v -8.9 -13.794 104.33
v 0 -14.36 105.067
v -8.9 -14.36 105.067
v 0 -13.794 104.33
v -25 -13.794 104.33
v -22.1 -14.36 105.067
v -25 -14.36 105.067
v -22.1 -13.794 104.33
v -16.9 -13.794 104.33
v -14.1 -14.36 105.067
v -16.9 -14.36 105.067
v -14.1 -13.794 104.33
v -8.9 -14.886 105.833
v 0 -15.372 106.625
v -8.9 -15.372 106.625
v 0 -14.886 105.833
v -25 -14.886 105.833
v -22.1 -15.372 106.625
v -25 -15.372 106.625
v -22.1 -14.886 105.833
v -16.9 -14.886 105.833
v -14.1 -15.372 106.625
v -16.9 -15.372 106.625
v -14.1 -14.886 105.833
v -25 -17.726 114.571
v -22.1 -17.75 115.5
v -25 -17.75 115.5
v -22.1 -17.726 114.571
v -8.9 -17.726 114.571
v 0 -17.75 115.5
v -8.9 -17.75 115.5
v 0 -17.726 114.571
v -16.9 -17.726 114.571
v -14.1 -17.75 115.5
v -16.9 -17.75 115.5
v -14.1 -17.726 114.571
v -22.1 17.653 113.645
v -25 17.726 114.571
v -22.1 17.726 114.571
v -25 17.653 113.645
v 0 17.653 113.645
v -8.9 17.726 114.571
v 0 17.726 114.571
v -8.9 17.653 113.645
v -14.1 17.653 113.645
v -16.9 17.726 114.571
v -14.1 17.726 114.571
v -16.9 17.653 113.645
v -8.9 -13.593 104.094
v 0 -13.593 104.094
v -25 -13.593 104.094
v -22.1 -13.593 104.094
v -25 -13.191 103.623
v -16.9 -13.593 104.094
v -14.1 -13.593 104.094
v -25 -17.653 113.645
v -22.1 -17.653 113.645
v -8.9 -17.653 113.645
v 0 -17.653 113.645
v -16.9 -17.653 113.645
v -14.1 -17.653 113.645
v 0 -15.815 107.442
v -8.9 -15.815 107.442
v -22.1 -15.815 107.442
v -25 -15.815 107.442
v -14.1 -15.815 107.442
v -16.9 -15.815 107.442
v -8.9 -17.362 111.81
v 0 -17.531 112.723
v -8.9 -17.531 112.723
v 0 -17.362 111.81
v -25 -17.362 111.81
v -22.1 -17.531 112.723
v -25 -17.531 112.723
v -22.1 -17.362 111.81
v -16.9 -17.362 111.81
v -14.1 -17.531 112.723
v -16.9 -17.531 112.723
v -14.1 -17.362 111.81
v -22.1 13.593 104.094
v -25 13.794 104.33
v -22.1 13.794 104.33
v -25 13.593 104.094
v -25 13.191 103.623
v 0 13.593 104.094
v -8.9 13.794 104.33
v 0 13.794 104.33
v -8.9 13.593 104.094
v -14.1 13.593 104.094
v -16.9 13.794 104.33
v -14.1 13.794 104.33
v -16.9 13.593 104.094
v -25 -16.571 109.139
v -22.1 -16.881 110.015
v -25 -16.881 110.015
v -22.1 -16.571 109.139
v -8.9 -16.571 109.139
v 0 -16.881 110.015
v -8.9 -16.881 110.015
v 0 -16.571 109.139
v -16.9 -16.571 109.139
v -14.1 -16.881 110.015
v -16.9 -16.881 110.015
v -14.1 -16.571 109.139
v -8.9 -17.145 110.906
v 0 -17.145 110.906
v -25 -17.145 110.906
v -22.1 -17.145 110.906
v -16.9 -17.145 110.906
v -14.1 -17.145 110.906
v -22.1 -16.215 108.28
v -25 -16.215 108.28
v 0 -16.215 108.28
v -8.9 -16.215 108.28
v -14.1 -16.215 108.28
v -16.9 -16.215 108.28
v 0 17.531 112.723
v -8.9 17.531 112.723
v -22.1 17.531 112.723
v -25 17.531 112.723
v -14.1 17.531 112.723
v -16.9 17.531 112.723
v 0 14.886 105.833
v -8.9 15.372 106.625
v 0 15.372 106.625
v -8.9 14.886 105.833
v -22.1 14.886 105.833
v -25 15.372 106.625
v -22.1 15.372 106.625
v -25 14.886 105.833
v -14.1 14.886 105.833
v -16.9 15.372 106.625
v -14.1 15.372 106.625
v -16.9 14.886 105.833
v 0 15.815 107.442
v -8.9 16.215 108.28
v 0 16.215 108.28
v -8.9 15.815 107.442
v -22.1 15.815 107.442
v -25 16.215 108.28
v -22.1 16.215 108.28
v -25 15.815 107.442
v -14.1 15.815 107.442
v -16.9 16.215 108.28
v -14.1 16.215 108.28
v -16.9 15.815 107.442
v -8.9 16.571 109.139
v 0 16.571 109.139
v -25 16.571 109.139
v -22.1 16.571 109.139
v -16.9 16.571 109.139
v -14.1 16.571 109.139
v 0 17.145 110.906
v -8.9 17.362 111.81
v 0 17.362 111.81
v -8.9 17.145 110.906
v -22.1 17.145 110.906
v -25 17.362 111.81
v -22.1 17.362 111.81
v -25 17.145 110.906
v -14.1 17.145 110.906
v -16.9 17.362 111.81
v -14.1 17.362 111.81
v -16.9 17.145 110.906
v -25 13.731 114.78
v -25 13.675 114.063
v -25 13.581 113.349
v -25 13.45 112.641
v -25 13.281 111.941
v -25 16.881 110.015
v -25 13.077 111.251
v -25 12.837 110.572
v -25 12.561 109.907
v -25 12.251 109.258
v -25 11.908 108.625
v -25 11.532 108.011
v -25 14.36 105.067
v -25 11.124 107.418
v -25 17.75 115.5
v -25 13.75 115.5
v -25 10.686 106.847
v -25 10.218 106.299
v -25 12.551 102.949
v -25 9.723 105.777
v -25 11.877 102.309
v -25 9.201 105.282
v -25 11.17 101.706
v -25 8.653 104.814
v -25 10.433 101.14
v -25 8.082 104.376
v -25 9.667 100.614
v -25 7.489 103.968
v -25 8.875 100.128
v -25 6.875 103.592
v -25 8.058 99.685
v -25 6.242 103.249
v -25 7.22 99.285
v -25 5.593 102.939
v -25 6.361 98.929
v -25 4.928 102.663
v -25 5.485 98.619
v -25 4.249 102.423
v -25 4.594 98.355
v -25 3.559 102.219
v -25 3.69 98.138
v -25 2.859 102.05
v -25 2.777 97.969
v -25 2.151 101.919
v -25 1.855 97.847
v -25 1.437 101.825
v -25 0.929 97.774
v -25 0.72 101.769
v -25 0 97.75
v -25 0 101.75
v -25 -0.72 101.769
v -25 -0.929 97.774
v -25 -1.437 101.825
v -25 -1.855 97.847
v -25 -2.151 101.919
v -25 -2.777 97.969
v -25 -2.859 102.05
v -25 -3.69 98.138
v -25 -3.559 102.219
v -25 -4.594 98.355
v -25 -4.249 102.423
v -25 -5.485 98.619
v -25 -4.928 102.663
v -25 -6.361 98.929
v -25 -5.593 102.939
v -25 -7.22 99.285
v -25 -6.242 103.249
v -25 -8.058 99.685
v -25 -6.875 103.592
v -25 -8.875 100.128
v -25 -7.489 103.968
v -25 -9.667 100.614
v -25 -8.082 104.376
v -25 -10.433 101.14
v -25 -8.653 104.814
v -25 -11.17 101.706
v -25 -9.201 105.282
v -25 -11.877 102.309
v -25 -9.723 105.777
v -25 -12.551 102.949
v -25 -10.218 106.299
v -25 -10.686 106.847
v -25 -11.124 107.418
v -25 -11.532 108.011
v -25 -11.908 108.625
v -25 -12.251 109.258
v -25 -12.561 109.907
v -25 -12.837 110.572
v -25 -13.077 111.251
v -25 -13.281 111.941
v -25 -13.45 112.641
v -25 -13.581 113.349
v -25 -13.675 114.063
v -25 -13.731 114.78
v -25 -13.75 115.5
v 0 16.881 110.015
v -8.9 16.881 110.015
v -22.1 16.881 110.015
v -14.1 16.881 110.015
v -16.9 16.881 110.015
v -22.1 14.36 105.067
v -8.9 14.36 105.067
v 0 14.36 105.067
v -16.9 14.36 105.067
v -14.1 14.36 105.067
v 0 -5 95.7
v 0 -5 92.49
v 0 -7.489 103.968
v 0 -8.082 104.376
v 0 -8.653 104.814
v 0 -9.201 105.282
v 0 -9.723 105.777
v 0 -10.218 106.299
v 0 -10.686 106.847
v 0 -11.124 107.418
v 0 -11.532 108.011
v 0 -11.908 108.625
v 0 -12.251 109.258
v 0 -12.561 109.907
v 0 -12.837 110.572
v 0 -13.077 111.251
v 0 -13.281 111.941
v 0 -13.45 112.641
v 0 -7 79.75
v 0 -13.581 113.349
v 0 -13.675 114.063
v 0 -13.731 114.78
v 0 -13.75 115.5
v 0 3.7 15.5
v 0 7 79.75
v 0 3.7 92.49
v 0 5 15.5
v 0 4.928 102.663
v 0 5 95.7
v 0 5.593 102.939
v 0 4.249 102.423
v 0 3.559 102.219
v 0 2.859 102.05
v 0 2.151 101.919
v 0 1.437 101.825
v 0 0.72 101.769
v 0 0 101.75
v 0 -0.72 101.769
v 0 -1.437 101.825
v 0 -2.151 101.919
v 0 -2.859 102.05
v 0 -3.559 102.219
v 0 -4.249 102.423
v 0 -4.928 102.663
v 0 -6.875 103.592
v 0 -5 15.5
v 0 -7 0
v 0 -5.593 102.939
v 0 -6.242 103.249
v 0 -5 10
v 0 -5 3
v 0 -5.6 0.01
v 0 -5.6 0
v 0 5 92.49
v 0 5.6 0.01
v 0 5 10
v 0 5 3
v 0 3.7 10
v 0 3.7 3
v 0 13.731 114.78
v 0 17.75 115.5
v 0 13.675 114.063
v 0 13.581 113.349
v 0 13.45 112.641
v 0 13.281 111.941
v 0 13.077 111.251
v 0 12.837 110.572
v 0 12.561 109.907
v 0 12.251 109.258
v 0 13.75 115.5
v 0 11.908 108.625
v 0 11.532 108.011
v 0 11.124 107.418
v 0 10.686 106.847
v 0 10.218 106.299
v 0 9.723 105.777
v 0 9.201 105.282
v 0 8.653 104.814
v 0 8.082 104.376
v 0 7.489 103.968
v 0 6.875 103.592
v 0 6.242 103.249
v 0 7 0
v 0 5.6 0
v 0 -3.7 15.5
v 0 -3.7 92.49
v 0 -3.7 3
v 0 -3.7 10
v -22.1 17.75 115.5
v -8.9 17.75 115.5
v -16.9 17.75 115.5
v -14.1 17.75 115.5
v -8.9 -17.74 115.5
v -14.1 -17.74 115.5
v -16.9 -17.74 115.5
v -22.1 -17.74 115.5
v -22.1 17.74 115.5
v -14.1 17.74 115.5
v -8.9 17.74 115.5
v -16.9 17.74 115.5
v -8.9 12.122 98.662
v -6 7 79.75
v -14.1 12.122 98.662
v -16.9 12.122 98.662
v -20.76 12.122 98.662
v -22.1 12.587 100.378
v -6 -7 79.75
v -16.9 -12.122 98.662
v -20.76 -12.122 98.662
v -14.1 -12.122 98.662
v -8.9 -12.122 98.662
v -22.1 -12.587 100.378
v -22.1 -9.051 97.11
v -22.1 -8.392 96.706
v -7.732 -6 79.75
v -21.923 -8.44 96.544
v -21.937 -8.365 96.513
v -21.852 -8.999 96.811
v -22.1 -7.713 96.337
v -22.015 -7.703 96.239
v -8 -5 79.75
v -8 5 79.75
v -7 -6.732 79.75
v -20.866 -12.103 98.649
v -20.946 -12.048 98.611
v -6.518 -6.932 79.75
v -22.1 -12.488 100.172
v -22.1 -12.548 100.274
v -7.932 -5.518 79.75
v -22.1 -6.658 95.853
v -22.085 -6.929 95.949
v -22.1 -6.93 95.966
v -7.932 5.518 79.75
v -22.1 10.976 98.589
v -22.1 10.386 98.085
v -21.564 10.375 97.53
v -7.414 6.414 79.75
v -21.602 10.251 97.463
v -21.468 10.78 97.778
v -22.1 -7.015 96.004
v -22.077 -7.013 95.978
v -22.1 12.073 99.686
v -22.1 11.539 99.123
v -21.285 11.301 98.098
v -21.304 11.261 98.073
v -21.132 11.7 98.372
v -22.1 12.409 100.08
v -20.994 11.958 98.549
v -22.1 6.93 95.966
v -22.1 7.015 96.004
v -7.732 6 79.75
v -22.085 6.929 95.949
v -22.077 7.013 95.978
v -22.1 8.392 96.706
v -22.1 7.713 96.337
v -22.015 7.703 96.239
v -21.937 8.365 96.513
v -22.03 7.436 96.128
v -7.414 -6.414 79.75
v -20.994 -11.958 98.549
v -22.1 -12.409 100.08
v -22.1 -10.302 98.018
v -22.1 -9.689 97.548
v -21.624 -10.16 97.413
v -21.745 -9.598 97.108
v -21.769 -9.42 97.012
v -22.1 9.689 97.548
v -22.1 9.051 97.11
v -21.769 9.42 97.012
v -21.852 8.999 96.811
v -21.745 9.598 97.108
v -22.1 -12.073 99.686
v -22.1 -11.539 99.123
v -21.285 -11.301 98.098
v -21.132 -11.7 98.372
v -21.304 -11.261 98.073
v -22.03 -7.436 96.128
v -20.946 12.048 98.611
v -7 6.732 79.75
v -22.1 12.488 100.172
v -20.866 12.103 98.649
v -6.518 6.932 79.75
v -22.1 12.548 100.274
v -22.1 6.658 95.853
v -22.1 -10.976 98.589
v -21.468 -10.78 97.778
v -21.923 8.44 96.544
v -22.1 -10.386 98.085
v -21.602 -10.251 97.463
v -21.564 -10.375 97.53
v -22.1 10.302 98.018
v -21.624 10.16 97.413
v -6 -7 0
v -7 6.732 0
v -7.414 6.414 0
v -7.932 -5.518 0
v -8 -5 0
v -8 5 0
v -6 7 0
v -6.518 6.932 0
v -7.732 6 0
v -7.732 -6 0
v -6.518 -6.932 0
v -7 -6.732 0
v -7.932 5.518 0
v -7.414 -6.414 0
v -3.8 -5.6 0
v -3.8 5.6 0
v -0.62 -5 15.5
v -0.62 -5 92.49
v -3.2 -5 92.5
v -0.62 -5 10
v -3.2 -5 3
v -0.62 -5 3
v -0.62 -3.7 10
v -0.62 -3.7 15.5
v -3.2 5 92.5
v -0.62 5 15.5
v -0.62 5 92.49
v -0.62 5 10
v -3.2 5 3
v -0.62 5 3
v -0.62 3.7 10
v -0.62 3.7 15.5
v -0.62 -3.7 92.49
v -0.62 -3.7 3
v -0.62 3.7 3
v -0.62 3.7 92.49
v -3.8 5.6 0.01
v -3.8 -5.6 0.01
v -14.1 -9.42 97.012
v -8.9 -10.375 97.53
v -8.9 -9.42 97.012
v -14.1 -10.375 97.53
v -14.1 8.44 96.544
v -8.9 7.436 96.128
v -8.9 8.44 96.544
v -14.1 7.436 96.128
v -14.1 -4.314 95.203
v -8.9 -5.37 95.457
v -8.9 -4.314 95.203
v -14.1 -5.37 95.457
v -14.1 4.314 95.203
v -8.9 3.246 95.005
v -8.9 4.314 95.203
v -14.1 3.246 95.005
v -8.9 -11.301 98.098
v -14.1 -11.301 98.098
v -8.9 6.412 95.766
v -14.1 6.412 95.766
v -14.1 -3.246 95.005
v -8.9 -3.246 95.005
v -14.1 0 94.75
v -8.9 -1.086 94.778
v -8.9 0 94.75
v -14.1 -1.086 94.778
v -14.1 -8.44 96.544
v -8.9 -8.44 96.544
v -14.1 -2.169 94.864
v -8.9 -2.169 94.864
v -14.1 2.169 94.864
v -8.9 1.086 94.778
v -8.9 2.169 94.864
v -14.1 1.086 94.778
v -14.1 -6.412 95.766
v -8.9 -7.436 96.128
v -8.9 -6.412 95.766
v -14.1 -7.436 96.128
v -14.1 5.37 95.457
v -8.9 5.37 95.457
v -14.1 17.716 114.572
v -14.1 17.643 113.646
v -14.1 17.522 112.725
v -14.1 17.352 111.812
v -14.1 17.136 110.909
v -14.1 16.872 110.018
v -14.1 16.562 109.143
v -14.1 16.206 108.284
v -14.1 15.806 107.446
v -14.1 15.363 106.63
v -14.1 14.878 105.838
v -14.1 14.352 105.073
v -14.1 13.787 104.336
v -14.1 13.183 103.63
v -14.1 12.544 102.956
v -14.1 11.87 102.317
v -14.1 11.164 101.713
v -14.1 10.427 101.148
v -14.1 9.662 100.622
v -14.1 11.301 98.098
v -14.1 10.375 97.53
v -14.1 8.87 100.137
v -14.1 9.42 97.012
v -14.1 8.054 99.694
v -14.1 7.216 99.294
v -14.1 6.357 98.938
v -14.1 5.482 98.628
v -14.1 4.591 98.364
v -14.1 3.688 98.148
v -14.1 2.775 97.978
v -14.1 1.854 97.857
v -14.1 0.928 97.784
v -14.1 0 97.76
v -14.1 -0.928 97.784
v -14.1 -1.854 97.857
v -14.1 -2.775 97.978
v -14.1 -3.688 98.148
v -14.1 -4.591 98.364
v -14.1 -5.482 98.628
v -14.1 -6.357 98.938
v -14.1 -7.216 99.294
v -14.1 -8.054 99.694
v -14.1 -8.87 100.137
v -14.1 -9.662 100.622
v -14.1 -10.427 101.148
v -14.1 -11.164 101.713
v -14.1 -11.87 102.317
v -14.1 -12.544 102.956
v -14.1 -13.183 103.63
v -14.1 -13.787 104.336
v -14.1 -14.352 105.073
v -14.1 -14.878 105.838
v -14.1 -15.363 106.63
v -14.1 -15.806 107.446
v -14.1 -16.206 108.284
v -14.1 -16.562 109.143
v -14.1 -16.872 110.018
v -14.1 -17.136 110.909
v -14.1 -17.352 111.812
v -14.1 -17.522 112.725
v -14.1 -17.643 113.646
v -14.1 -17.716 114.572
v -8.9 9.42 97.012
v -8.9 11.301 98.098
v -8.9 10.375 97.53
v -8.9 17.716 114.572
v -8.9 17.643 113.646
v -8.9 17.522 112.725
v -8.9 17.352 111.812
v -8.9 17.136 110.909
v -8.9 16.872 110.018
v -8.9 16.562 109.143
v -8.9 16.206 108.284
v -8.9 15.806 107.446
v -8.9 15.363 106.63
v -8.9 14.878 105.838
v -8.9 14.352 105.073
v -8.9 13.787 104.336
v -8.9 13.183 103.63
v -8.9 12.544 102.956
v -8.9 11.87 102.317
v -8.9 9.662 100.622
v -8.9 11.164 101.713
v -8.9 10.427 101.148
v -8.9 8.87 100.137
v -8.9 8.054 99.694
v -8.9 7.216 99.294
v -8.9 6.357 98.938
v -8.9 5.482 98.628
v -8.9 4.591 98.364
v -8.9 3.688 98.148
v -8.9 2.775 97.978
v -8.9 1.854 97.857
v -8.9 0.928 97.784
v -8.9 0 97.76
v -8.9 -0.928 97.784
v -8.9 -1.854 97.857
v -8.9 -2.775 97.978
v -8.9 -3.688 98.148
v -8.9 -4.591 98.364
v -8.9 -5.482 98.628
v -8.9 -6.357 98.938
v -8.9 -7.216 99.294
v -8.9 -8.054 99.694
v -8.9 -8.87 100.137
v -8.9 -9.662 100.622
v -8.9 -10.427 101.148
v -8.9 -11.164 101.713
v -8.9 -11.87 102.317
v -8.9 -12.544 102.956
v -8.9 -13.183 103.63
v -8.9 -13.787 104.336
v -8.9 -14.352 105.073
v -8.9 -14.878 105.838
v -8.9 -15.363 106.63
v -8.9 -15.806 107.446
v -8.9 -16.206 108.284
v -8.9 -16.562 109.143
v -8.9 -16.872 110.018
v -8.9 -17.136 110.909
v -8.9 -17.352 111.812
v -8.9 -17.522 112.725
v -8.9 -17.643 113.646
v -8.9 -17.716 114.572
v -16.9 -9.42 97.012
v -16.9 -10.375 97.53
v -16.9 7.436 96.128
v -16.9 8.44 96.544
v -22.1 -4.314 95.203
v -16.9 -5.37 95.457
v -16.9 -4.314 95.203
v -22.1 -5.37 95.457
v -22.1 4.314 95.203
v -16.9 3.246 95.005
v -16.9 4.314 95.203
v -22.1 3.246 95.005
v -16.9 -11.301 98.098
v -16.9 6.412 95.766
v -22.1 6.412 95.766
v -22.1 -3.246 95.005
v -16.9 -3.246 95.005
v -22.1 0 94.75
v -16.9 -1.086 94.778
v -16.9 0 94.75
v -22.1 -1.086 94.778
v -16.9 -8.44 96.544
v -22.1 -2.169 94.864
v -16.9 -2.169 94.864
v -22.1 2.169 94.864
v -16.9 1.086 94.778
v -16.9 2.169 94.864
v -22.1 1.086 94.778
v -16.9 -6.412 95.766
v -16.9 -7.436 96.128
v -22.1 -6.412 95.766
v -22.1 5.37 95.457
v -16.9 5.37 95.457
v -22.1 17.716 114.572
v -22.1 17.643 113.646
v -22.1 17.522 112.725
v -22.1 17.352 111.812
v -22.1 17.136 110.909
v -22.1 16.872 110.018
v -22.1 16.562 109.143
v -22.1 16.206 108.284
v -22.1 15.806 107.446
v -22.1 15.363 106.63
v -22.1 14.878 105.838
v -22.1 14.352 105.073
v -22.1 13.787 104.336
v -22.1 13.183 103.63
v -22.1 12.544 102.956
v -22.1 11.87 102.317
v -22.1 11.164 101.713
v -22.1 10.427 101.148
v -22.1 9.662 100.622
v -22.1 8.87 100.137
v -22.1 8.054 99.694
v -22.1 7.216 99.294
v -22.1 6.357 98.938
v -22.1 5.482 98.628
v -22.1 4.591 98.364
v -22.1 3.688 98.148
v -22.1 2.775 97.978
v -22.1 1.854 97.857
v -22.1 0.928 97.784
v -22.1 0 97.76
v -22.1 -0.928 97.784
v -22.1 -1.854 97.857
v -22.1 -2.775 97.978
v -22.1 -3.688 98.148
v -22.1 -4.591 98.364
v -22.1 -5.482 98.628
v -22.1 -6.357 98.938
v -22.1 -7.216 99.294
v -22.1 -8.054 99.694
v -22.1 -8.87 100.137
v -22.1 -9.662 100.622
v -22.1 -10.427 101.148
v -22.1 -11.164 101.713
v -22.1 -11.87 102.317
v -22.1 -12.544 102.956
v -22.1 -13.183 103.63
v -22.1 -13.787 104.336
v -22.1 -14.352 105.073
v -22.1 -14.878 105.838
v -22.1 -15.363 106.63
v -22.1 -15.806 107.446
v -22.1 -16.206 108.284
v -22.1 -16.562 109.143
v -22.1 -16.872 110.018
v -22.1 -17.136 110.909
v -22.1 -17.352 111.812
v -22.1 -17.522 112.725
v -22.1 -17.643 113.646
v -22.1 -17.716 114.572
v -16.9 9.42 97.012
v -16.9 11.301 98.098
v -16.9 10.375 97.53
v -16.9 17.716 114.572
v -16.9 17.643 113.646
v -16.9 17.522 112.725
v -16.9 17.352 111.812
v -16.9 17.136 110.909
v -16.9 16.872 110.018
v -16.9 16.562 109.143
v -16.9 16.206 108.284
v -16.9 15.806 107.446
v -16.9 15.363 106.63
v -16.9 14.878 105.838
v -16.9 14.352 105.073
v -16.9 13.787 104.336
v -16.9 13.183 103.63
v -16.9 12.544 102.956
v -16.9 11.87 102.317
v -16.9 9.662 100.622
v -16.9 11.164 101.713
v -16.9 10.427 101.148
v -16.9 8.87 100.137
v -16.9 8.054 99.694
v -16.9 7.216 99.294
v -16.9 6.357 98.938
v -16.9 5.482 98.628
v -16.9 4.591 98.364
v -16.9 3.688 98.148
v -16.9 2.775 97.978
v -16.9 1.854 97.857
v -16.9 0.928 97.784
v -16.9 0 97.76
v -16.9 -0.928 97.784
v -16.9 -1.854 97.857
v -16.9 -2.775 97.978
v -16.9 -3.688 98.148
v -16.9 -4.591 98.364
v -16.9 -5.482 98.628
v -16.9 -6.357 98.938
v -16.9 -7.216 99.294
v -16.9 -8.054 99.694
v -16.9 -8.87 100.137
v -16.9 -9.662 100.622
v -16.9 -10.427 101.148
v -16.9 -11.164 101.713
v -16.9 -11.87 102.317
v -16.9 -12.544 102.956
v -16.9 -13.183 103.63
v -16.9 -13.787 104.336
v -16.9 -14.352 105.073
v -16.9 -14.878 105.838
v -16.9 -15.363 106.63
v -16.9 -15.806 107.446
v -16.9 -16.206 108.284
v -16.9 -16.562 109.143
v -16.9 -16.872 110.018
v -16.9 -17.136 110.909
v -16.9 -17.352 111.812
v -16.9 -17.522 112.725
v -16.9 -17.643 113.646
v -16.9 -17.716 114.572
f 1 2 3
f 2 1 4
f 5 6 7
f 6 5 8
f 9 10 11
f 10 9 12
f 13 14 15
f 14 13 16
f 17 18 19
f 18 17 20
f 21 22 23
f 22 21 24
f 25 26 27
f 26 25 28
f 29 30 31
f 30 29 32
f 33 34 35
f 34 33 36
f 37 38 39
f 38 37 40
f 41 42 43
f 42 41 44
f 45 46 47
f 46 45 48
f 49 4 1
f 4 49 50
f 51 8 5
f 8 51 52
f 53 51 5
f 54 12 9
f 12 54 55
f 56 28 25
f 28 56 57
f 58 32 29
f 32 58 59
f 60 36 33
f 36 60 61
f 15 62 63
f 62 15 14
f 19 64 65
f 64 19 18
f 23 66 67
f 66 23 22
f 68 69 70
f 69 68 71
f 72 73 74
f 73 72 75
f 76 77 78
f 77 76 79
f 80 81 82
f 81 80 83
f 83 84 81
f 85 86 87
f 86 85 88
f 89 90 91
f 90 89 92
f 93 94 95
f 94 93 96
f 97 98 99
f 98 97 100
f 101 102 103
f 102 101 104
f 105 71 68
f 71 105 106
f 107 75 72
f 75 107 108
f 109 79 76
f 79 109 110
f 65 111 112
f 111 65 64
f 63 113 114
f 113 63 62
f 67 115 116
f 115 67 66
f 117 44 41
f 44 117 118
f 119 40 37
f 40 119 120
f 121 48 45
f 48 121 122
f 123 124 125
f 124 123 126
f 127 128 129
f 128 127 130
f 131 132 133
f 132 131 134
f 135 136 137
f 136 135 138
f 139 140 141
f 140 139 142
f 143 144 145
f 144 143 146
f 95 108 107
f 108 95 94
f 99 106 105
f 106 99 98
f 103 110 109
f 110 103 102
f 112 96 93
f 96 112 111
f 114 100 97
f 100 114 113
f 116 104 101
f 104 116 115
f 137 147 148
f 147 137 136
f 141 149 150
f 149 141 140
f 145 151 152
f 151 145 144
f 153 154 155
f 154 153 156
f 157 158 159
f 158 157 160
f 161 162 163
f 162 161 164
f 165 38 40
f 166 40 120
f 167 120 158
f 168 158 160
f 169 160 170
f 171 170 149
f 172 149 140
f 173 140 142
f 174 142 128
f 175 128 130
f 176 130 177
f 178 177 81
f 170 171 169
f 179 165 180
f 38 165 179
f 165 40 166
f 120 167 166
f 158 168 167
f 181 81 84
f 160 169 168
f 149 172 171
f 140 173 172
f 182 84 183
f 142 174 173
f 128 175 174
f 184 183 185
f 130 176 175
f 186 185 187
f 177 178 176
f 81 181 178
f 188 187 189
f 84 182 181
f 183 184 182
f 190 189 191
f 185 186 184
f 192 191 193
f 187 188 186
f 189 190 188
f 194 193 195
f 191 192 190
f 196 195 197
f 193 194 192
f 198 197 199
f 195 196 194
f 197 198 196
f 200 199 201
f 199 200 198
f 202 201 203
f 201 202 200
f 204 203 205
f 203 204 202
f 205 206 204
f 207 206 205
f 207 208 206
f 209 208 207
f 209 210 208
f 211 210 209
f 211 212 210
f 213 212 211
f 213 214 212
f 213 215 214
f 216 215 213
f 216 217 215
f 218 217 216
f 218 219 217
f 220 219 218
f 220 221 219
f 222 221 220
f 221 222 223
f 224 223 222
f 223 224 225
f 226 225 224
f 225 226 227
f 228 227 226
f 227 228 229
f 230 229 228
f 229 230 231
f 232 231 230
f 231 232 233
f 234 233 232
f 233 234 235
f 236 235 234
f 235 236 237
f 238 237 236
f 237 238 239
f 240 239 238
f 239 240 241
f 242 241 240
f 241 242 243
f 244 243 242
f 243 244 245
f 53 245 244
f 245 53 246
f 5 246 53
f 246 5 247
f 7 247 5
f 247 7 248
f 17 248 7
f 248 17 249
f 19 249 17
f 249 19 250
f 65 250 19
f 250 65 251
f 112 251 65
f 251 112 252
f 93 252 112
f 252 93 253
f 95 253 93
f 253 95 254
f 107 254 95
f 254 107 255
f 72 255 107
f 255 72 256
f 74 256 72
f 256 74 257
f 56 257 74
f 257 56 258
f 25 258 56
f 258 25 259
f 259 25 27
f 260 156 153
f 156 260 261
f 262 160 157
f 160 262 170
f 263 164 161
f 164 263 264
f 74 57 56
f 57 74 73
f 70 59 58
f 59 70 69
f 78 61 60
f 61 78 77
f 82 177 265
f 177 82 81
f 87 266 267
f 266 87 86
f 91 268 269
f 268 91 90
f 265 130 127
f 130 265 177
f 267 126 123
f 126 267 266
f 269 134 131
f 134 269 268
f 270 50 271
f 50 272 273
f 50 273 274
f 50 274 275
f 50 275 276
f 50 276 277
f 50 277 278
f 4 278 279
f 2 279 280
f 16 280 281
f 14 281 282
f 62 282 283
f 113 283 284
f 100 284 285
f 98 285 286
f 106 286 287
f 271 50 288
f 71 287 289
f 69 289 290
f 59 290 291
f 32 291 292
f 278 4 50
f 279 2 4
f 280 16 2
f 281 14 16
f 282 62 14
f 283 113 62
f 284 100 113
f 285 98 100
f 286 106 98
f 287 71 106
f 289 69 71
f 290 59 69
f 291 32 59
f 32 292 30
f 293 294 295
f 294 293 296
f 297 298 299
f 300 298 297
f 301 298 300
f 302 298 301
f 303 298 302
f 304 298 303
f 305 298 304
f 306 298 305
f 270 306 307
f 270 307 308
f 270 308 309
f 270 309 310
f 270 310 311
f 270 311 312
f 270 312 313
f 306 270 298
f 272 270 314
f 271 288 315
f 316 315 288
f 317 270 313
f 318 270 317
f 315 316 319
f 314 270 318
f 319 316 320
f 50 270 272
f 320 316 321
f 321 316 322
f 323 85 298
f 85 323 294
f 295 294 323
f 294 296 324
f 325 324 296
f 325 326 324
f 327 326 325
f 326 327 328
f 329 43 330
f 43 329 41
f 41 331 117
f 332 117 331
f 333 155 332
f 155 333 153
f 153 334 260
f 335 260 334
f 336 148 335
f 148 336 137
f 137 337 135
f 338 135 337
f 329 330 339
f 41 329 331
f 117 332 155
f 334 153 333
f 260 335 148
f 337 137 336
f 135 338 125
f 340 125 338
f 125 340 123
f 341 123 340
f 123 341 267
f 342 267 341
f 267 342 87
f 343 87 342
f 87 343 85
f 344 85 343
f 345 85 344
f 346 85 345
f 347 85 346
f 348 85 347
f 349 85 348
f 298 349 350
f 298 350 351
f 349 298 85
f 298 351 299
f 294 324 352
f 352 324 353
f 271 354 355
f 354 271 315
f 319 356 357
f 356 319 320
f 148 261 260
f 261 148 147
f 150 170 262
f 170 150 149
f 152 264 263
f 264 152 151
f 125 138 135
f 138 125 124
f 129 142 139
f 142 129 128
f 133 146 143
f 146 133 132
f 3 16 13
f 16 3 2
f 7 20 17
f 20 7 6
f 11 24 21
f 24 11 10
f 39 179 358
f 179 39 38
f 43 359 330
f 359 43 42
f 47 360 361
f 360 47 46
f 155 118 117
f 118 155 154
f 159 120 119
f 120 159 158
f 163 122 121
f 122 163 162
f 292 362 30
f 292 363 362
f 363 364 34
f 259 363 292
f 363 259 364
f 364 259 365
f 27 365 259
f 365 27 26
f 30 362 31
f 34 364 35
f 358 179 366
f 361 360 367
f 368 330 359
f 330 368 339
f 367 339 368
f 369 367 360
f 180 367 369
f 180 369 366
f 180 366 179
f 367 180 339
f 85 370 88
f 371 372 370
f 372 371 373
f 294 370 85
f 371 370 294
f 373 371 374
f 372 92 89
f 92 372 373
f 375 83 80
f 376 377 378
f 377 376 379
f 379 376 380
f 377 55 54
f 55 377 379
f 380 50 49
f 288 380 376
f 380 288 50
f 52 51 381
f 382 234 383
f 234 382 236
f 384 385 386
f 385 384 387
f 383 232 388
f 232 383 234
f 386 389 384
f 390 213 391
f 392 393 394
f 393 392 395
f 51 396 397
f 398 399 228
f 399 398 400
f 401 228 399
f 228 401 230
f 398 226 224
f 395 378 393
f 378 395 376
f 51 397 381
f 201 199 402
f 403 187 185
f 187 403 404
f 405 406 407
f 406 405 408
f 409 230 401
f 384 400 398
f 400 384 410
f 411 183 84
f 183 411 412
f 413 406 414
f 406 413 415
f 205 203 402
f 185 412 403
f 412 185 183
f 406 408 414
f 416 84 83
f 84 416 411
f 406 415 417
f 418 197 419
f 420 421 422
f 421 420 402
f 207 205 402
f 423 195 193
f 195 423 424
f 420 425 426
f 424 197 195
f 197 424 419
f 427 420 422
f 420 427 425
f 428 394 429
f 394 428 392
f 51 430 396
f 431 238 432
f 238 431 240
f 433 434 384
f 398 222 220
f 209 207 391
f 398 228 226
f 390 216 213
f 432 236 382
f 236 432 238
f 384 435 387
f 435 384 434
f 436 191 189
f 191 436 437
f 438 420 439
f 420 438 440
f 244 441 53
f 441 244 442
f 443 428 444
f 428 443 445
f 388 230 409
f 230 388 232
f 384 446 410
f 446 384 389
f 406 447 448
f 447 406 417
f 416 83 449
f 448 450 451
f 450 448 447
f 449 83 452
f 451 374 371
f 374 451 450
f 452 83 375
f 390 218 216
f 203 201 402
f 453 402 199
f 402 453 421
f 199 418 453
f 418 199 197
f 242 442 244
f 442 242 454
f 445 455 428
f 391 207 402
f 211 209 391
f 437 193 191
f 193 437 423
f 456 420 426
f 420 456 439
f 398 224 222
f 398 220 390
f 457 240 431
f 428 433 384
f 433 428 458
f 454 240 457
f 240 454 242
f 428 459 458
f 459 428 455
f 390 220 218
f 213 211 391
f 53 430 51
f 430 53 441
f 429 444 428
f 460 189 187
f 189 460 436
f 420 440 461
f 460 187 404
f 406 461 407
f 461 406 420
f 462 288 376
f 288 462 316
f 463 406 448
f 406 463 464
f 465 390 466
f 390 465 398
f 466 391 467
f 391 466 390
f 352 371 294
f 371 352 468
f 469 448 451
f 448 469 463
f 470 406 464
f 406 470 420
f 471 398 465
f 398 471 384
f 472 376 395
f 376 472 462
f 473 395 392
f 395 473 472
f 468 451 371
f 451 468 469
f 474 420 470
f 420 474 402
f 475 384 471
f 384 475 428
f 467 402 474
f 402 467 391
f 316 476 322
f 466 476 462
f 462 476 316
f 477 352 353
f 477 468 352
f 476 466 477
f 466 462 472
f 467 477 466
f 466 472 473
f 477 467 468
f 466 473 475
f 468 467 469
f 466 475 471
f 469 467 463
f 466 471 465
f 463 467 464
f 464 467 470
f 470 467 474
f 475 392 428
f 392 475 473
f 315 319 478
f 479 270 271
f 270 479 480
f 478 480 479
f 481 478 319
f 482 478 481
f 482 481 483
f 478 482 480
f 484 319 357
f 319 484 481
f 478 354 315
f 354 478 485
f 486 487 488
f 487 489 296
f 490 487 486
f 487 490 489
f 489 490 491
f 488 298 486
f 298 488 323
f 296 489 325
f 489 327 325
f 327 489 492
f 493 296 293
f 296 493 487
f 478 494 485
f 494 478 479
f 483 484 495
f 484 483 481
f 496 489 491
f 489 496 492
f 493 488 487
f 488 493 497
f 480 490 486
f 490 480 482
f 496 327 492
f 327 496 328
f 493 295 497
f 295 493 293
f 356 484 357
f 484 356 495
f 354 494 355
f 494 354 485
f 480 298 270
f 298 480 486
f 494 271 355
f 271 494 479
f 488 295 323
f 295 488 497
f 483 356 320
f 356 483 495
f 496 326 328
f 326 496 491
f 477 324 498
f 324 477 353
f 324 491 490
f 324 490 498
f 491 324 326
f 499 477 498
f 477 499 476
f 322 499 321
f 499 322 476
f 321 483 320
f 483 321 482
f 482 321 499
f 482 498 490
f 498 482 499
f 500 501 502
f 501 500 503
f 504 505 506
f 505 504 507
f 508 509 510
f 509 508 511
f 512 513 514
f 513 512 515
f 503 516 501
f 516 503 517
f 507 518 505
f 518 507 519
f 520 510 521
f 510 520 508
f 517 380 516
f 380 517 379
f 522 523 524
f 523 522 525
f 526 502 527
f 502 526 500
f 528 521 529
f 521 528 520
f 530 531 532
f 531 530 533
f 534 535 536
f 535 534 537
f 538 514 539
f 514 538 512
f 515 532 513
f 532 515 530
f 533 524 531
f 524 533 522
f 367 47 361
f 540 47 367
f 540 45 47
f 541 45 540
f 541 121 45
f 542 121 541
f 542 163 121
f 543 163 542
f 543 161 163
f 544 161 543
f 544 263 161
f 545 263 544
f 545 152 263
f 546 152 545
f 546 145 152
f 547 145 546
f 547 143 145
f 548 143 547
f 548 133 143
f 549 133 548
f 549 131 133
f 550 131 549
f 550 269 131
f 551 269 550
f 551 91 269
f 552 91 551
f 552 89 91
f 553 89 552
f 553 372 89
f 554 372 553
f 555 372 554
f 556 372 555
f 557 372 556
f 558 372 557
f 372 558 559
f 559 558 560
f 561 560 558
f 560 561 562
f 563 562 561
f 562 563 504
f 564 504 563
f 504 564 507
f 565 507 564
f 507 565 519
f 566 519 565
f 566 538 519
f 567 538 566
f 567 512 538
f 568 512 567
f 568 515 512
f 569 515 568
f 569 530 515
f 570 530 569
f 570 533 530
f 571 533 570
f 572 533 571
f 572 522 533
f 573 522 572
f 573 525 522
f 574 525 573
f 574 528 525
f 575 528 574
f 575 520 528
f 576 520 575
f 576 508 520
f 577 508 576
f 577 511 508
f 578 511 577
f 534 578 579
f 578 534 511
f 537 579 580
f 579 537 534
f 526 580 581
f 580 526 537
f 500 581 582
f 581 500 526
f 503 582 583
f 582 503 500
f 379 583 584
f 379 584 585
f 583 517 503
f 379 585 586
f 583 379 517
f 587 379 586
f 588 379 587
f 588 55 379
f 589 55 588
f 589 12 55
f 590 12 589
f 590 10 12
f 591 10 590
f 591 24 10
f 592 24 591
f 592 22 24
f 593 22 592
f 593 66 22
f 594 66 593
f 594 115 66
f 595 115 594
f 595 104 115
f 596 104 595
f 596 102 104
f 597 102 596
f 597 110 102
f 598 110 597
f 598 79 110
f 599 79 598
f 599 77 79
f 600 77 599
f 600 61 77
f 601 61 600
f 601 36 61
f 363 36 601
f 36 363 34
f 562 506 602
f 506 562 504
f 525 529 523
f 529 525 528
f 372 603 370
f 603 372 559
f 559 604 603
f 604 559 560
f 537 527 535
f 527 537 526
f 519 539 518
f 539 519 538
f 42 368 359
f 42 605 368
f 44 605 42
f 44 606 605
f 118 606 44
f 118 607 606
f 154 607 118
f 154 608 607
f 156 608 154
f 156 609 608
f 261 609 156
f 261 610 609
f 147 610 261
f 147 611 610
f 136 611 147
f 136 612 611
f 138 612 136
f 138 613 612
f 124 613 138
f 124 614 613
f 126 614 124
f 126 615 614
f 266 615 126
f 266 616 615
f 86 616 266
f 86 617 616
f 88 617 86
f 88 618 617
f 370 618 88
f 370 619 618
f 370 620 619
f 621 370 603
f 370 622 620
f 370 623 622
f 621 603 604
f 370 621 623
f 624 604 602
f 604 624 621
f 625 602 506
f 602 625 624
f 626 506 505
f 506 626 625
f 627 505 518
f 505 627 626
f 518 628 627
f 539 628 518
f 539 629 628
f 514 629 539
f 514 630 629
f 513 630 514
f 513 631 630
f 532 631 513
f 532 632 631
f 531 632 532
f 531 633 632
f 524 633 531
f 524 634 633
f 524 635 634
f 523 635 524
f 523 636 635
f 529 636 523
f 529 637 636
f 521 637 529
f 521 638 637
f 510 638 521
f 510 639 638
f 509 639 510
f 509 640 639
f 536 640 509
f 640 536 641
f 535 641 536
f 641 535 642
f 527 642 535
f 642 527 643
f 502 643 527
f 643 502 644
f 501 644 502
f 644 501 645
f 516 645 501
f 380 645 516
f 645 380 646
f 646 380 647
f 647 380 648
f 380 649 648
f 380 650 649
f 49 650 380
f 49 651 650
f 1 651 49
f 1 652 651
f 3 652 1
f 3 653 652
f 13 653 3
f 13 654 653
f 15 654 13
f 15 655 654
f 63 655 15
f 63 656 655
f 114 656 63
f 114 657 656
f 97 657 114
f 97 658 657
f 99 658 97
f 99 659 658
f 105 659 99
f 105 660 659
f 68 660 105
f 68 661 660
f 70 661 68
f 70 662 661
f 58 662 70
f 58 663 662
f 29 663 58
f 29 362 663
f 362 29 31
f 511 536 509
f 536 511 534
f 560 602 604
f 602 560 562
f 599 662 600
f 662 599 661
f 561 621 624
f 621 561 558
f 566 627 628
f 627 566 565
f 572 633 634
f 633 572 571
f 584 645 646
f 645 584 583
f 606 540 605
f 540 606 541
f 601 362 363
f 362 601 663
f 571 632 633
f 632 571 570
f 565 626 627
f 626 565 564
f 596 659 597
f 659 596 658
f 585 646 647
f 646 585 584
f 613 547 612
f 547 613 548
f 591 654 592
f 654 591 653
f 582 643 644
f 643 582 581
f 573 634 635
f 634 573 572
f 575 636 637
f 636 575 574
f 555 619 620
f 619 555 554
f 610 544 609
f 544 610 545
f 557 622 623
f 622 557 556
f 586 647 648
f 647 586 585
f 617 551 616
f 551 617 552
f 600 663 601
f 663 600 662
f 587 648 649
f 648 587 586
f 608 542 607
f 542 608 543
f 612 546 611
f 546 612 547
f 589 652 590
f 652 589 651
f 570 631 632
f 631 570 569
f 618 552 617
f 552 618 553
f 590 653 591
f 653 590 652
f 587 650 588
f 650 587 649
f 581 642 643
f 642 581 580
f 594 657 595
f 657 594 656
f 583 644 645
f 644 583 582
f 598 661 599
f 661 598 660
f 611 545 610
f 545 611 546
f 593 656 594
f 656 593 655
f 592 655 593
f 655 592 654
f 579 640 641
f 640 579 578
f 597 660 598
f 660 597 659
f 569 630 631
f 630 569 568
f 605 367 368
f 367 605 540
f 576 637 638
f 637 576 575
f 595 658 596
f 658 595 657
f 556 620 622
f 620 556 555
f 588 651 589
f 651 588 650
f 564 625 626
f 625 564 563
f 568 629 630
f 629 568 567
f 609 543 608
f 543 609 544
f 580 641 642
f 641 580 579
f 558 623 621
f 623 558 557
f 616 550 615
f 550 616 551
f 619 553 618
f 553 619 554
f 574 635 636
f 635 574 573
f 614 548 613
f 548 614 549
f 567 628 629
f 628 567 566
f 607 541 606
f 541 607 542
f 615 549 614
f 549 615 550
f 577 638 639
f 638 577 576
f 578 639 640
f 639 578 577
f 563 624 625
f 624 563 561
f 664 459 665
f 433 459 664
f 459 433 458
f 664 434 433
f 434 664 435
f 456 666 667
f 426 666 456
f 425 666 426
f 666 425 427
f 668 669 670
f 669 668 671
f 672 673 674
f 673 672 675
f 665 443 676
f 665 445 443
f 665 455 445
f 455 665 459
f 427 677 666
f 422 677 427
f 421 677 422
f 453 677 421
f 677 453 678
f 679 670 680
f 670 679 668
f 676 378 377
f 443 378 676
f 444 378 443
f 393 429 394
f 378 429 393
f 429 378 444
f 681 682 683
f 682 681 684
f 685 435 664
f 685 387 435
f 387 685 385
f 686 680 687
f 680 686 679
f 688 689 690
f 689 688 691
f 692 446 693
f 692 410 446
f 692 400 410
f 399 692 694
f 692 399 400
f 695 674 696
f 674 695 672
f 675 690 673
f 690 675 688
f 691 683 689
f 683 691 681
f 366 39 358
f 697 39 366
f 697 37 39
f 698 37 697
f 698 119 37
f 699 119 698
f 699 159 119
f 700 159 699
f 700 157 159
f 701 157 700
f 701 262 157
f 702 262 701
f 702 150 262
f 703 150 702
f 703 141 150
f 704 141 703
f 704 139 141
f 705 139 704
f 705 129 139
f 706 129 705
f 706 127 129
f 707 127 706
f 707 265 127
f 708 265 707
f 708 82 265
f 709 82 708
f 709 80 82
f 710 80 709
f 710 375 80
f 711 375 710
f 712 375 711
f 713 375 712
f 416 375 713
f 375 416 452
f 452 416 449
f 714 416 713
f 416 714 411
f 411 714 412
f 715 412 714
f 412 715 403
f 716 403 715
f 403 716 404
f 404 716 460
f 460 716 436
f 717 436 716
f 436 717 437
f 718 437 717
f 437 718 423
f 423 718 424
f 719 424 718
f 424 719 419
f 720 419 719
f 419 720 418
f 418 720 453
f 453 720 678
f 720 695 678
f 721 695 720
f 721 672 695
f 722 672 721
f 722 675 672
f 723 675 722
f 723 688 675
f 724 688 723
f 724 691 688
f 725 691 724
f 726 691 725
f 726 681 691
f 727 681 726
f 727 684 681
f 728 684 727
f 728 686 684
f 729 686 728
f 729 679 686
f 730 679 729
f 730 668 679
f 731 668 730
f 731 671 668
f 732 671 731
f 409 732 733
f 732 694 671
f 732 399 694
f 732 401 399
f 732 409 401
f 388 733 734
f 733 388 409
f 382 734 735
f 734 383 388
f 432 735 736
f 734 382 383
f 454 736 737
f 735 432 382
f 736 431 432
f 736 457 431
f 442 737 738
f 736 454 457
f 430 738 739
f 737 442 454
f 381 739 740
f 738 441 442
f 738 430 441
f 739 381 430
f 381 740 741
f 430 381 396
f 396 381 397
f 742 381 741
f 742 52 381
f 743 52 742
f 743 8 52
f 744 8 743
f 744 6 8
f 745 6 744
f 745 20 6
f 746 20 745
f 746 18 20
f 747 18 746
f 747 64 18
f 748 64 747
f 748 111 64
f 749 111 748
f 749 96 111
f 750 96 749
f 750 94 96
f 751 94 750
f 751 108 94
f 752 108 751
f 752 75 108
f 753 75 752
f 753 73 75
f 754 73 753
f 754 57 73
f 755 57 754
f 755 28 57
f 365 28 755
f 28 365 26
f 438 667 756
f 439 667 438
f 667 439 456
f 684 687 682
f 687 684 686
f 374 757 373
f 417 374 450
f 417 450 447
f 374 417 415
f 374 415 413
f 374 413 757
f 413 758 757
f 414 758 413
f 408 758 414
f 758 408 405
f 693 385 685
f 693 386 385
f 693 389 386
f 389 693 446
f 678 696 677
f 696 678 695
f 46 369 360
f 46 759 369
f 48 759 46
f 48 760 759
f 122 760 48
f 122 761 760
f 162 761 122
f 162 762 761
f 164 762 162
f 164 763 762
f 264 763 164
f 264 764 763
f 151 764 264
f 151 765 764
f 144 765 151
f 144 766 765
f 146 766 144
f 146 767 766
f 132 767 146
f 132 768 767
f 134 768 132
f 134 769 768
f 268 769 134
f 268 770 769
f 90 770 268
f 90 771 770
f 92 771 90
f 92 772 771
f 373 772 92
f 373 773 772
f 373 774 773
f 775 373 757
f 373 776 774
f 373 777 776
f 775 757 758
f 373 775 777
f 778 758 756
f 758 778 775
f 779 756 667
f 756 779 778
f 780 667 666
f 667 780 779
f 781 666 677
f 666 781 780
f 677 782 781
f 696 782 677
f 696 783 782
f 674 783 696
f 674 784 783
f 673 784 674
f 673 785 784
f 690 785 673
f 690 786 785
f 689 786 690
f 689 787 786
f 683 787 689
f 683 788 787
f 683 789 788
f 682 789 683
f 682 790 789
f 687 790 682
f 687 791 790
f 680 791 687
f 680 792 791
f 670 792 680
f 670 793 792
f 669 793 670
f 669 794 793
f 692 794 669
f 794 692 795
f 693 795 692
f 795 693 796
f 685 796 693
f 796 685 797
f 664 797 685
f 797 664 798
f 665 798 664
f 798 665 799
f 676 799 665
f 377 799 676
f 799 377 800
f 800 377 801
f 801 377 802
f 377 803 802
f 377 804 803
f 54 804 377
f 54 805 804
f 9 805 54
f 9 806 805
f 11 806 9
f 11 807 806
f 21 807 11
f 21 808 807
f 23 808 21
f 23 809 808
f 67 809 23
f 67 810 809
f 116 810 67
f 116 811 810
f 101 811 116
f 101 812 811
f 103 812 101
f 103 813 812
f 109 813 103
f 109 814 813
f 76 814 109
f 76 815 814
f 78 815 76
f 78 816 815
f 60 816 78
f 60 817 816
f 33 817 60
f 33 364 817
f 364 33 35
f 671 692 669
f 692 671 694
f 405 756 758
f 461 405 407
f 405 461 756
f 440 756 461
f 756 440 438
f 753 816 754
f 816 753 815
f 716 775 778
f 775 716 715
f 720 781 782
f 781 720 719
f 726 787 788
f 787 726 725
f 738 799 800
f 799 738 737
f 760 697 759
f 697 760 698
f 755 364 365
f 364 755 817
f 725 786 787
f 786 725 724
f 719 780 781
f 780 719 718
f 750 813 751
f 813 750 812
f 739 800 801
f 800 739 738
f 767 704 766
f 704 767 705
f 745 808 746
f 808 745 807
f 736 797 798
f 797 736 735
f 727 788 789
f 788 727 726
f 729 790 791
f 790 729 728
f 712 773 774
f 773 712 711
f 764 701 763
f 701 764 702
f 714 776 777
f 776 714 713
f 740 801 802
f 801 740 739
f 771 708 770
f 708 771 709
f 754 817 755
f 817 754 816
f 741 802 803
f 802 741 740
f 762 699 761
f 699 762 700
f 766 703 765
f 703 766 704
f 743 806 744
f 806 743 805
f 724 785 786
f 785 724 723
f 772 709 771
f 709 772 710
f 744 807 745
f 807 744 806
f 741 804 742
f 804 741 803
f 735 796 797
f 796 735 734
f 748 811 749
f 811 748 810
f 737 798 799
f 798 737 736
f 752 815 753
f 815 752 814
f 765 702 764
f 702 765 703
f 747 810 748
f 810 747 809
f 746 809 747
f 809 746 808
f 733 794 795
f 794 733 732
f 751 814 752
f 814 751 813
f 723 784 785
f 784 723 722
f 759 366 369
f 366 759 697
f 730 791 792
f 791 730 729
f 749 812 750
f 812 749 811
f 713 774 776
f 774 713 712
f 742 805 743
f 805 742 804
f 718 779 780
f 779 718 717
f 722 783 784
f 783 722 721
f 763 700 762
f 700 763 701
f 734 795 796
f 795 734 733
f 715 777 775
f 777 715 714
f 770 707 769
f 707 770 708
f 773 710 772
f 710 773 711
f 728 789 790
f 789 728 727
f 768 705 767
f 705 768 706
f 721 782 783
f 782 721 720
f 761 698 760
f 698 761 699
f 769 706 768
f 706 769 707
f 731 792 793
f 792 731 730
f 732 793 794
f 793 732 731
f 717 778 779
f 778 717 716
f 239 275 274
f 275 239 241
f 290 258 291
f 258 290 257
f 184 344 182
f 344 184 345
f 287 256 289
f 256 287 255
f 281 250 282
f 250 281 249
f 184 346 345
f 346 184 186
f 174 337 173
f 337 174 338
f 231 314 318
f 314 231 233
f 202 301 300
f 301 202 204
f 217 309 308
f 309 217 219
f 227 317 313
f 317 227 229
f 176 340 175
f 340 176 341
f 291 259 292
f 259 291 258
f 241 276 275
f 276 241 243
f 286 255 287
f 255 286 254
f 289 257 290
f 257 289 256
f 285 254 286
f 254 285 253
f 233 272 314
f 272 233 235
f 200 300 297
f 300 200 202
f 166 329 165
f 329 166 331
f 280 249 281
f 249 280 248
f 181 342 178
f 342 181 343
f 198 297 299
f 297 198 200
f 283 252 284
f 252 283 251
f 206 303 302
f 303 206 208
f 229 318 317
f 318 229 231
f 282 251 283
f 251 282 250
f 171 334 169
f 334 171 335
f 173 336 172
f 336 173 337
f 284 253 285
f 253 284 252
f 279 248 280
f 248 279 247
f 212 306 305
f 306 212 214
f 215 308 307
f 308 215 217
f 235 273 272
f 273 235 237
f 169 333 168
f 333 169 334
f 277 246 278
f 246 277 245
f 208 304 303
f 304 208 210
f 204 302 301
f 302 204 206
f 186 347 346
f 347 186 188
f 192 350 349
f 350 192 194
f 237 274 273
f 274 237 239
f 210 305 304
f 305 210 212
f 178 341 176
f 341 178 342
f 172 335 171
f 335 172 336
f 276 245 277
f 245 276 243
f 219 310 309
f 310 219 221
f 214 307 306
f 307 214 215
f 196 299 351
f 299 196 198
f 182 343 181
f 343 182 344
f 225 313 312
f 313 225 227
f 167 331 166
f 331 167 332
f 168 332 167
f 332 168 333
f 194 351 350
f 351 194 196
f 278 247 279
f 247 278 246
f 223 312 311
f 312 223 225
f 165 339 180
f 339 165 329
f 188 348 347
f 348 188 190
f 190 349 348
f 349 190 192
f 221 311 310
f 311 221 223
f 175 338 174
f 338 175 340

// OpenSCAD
// file: ../../lib/joycon_rail.scad
// ============================================================
// Nintendo Switch (1) Joy-Con female rail
// Part of ControllerCyclingMounts.  Use with:  use <../../lib/joycon_rail.scad>
//
// Fit-tested with Switch 1 Joy-Cons: slides on smoothly and the latch
// clicks. Dimensions: docs/design-notes.md.
// NOT compatible with Joy-Con 2 (magnetic attachment).
//
// Local frame for all modules here:
//   rail face at x = 0, material at x < 0
//   rail runs along +Y; the open end (where the Joy-Con's shoulder
//   end ends up) is at y = len, the closed end at y = 0
//   z = 0 is the rail centreline (Joy-Con is ~14 mm thick, centred)
// ============================================================

JC_SLOT_W   = 7.40;  // opening between the two lips
JC_LIP_T    = 0.62;  // lip thickness
JC_INNER_W  = 10.0;  // height of the undercut cavity
JC_INNER_D  = 2.58;  // depth of the cavity behind the lips
JC_RAIL_LEN = 92.5;  // channel length; the Joy-Con bottoms out at the end
JC_BODY_T   = 14;    // Joy-Con thickness at the rail

// Total depth of the channel below the rail face
function joycon_rail_depth() = JC_LIP_T + JC_INNER_D;

// Subtract this from a solid. The channel starts at y = len - rail_len
// and is open past y = len.
//   lead_in     flare at the entrance
//   notch_*     latch notches (cut into both lips)
//   end_slope   closed end sloped (x this many channel depths) so it
//               prints without bridging when the rail stands vertically
//   open_both_ends  for short test pieces
module joycon_rail_channel(len = JC_RAIL_LEN, rail_len = JC_RAIL_LEN,
                           lead_in = 0.6, notch_from = 10.0, notch_len = 5.5,
                           end_slope = 2, open_both_ends = false) {
    eps = 0.01;
    y0 = len - rail_len;
    cd = JC_LIP_T + JC_INNER_D;
    ext = open_both_ends ? 1 : 0;
    translate([-cd, y0 - ext, -JC_INNER_W/2]) cube([JC_INNER_D, rail_len + 1 + ext, JC_INNER_W]);
    translate([-JC_LIP_T - eps, y0 - ext, -JC_SLOT_W/2]) cube([JC_LIP_T + 1, rail_len + 1 + ext, JC_SLOT_W]);
    if (!open_both_ends && end_slope > 0)
        hull() {
            translate([-cd, y0, -JC_INNER_W/2]) cube([cd + 1, eps, JC_INNER_W]);
            translate([0, y0 - end_slope * cd, -JC_INNER_W/2]) cube([1, eps, JC_INNER_W]);
        }
    // entrance flare(s)
    for (e = open_both_ends ? [0, 1] : [0])
        translate([0, e == 0 ? len : y0, 0]) mirror([0, e == 0 ? 0 : 1, 0])
            hull() {
                translate([-cd - lead_in, -eps, -JC_INNER_W/2 - lead_in])
                    cube([cd + lead_in + 1, 1, JC_INNER_W + 2 * lead_in]);
                translate([-cd, -3, -JC_INNER_W/2]) cube([cd + 1, eps, JC_INNER_W]);
            }
    // latch notches in both lips
    nd = (JC_INNER_W - JC_SLOT_W) / 2;
    for (s = [-1, 1])
        translate([-JC_LIP_T - 0.3, len - notch_from - notch_len,
                   s < 0 ? -JC_INNER_W/2 : JC_SLOT_W/2 - eps])
            cube([JC_LIP_T + 1, notch_len, nd + eps]);
}

// Short piece of rail for checking fit on your printer.
// Printed standing up (channel vertical), the way the full mounts print.
module joycon_rail_test(len = 25, block_w = 15, block_t = JC_BODY_T) {
    rotate([-90, 0, 0]) translate([0, -len, 0]) difference() {
        translate([-block_w, 0, -block_t/2]) cube([block_w, len, block_t]);
        joycon_rail_channel(len = len, rail_len = len, open_both_ends = true);
    }
}
// main file
// ============================================================
// Joy-Con Handlebar Mount (direct to bar, "Zwift Play" position)
// Holds ONE Nintendo Switch (1) Joy-Con just inboard of the hood,
// face up, long axis pointing forward, its rail facing outboard
// toward the hood. The mount clamps onto the bar tops near the bend
// and a rail beam runs forward from the clamp.
//
//   side = "left"  -> mounts on the LEFT bar, holds the RIGHT Joy-Con
//   side = "right" -> mounts on the RIGHT bar, holds the LEFT Joy-Con
//
// Orientation (as mounted, rider's view):
//   +X = toward the stem (inboard) on the left bar
//   +Y = forward, +Z = up
//   The bar tops run along X through the origin.
//   The Joy-Con slides in from the FRONT and bottoms out at the
//   closed end of the rail, near the clamp.
//   Pitch is set by rotating the clamp on the bar before tightening.
//
// Clamp styles:
//   "strap" one-piece saddle; hold it on with zip ties, velcro, or
//           Garmin-style rubber O-rings through the two strap channels
//   "bolt"  two-piece split clamp, 2x M4 bolts + nuts (side-loaded
//           nut slots); optional printed TPU shim for smaller bars
//
// Print: the mount stands on the FRONT end of the rail beam, so the
//        rail runs vertically (like the grip) and nothing floats.
//        No supports. The bolt cap and TPU shim print standing on an
//        end face.
//
// Part of ControllerCyclingMounts. Rail comes from ../../lib.
// NOT for Joy-Con 2 (magnetic attachment).
// ============================================================

use <../../lib/joycon_rail.scad>

/* [What to render] */
part = "mount"; // [mount, cap, shim, preview]
side = "left";  // [left, right]
clamp_style = "strap"; // [strap, bolt]
print_orient = true;   // orient the part for printing

/* [Handlebar] */
bar_d        = 27;   // bar diameter WITH tape at the clamp spot (typ. 24-32)
clamp_w      = 25;   // clamp width along the bar (keep it on the straight part)
clamp_wall   = 4;
clamp_x_offset = 0;  // shift the clamp along the bar (- = outboard)

/* [Joy-Con position] */
rail_forward = 0;    // extra gap between bar and Joy-Con (mm)
rail_dz      = 0;    // raise (+) / lower (-) the Joy-Con relative to the bar centre
yaw          = 0;    // deg; + turns the front of the Joy-Con outboard, toward the hood
beam_w       = 8;    // rail beam width (rail depth is 3.2 mm)
end_cap      = 6;    // solid end of the rail behind the Joy-Con
jc_tail      = 7.5;  // how far the Joy-Con body extends behind its rail
jc_clear     = 2;    // clearance between Joy-Con and bar

/* [Strap clamp] */
strap_w      = 5.2;  // channel width (zip tie 4.8, O-ring ~3, narrow velcro 5)
strap_t      = 3.0;  // channel depth
strap_x      = [-11.5, -19.5]; // channel centres, relative to the rail face
liner_t      = 0;    // room for a rubber liner inside the saddle (0 = none)

/* [Bolt clamp] */
bolt_d       = 4.4;  // M4 clearance
nut_af       = 7.3;  // M4 nut across flats + clearance
nut_t        = 3.4;
head_d       = 7.6;  // M4 socket head + clearance
clamp_gap    = 1.0;  // gap between the halves, so the bolts can squeeze
cap_ear_h    = 10;   // ear depth on the cap
shim_t       = 1.0;  // TPU shim thickness: fits a bar 2*shim_t smaller than bar_d

$fn = 72;
eps = 0.01;
T   = 14;            // Joy-Con thickness at the rail
JC_RAIL = 92.5;
CD  = joycon_rail_depth();

Lb  = end_cap + JC_RAIL;                     // beam length
R_in  = bar_d/2 + (clamp_style == "strap" ? 0.25 + liner_t : 0);
R_out = R_in + clamp_wall;
y_closed = bar_d/2 + jc_clear + jc_tail + rail_forward; // closed end of the rail
y_b = y_closed - end_cap;                    // rear of the beam
cx0 = -clamp_w + clamp_x_offset;             // clamp spans x = cx0 .. cx0 + clamp_w
cx1 = cx0 + clamp_w;
z_b = R_in + 3.2;                            // bolt axis distance from bar centre
bolt_x = (cx0 + cx1) / 2;
ear_out = z_b + 6;

// ---------- beam ------------------------------------------------
module beam_place() {
    translate([0, y_b, rail_dz]) rotate([0, 0, yaw]) children();
}

// Beam in its own frame: rail face at x = 0 (facing +X), material x < 0,
// y = 0 (rear) .. Lb (front, open end).  Rail face square, other edges rounded.
module beam_solid(len = Lb) {
    r = 2;
    hull() {
        translate([-eps, 0, -T/2]) cube([eps, len, T]);
        for (z = [-1, 1]) translate([-beam_w + r, 0, z * (T/2 - r)])
            rotate([-90, 0, 0]) cylinder(r = r, h = len, $fn = 24);
    }
}

// ---------- clamp pieces ----------------------------------------
module bar_cyl(r, x0 = cx0, w = clamp_w) {
    translate([x0, 0, 0]) rotate([0, 90, 0]) cylinder(r = r, h = w, $fn = 120);
}

// front half shell (y >= y0)
module front_shell(y0) {
    intersection() {
        bar_cyl(R_out);
        translate([cx0 - 1, y0, -R_out - 1]) cube([clamp_w + 2, R_out + 1, 2 * R_out + 2]);
    }
}

// arc of the shell within +-a deg of straight ahead (for the hull)
module front_arc(a = 50) {
    intersection() {
        bar_cyl(R_out);
        translate([cx0, 0, 0]) rotate([90, 0, 90]) linear_extrude(clamp_w)
            polygon([[0, 0], for (t = [-a : 5 : a]) 3 * R_out * [cos(t), sin(t)]]);  // u = +Y, v = +Z
    }
}

// Solid that connects the shell to the beam. It is a hull, sized so
// every downward-facing surface is <= 45 deg when the mount stands on
// the front of its rail for printing.
gusset_len = max(10, R_out + (clamp_w - beam_w) + 1 - y_b);
module web() {
    hull() {
        front_arc();
        beam_place() beam_solid(len = gusset_len);
        if (clamp_style == "bolt") front_ears();
    }
}

// ears for the bolt clamp, beam half (flat top on the split face;
// the web hull runs from them down to the beam)
module front_ears() {
    for (s = [-1, 1]) mirror([0, 0, s < 0 ? 1 : 0])
        translate([cx0, clamp_gap/2, R_in - 1]) cube([clamp_w, nut_t + 5, ear_out - R_in + 1]);
}

module front_ear_cuts() {
    for (s = [-1, 1]) mirror([0, 0, s < 0 ? 1 : 0]) {
        // bolt hole
        translate([bolt_x, -1, z_b]) rotate([-90, 0, 0]) cylinder(d = bolt_d, h = 30, $fn = 32);
        // side-loaded nut slot
        translate([bolt_x - nut_af/2, clamp_gap/2 + 2.5, z_b - nut_af * 0.5774])
            cube([nut_af, nut_t, 20]);
    }
}

module cap_body() {
    difference() {
        union() {
            intersection() {
                bar_cyl(R_out);
                translate([cx0 - 1, -R_out - 1, -R_out - 1]) cube([clamp_w + 2, R_out + 1 - clamp_gap/2, 2 * R_out + 2]);
            }
            for (s = [-1, 1]) mirror([0, 0, s < 0 ? 1 : 0])
                translate([cx0, -cap_ear_h, R_in - 1]) cube([clamp_w, cap_ear_h - clamp_gap/2, ear_out - R_in + 1]);
        }
        bar_cyl(R_in, cx0 - 1, clamp_w + 2);
        for (s = [-1, 1]) mirror([0, 0, s < 0 ? 1 : 0]) {
            translate([bolt_x, -cap_ear_h - 1, z_b]) rotate([-90, 0, 0]) cylinder(d = bolt_d, h = cap_ear_h + 2, $fn = 32);
            translate([bolt_x, -cap_ear_h - 1, z_b]) rotate([-90, 0, 0]) cylinder(d = head_d, h = cap_ear_h - 4.5 + 1, $fn = 32);
        }
    }
}

// ---------- the mount (as installed, left bar) --------------------
module mount_left() {
    difference() {
        union() {
            front_shell(clamp_style == "bolt" ? clamp_gap/2 : 0);
            web();
            beam_place() beam_solid();
            if (clamp_style == "bolt") front_ears();
        }
        // the bar
        bar_cyl(R_in, cx0 - 50, clamp_w + 100);
        // nothing behind the bar centre (strap) / the split (bolt)
        translate([cx0 - 60, -100 + (clamp_style == "bolt" ? clamp_gap/2 : 0), -100])
            cube([clamp_w + 120, 100, 200]);
        // rail
        beam_place() joycon_rail_channel(len = Lb, rail_len = JC_RAIL, end_slope = 1);
        // strap channels: a band just outside the shell, all the way round
        if (clamp_style == "strap")
            for (x = strap_x) difference() {
                bar_cyl(R_out + strap_t, x - strap_w/2, strap_w);
                bar_cyl(R_out - eps, x - strap_w/2 - 1, strap_w + 2);
            }
        if (clamp_style == "bolt") front_ear_cuts();
    }
}

module shim() {
    difference() {
        bar_cyl(R_in);
        bar_cyl(R_in - shim_t, cx0 - 1, clamp_w + 2);
        translate([cx0 - 1, -1, 0]) cube([clamp_w + 2, 2, R_out]);   // split
    }
}

module sided() {
    if (side == "right") mirror([1, 0, 0]) children(); else children();
}

// ---------- print orientation -----------------------------------
// Beam vertical, front (open) end of the rail on the bed.
module mount_print() {
    translate([0, 0, Lb]) rotate([-90, 0, 0])
        rotate([0, 0, -yaw]) translate([0, -y_b, -rail_dz]) mount_left();
}
// Clamp axis vertical, standing on an end face.
module axis_up() { rotate([0, 90, 0]) translate([-cx0 - clamp_w, 0, 0]) children(); }

// ---------- preview -----------------------------------------------
module preview() {
    sided() {
        mount_left();
        if (clamp_style == "bolt") color("orange") cap_body();
        // stand-in bar: tops plus the bend toward the hood
        color("dimgray") {
            bar_cyl(bar_d/2, cx0 - 5, 120);
            translate([cx0 - 5, 35, 0]) rotate([0, 0, 180]) rotate_extrude(angle = 90, $fn = 48)
                translate([35, 0]) circle(d = bar_d, $fn = 36);
            translate([cx0 - 40, 35, 0]) rotate([-90, 0, 0]) cylinder(d = bar_d, h = 60);
        }
        // stand-in Joy-Con
        beam_place() color("limegreen", 0.85)
            translate([0, end_cap - jc_tail, -T/2]) cube([35.9, 102, T]);
    }
}

// ---------- dispatch ----------------------------------------------
if (part == "mount") {
    if (print_orient) sided() mount_print(); else sided() mount_left();
}
else if (part == "cap") {
    if (print_orient) axis_up() cap_body(); else sided() cap_body();
}
else if (part == "shim") {
    if (print_orient) axis_up() shim(); else sided() shim();
}
else if (part == "preview") preview();
